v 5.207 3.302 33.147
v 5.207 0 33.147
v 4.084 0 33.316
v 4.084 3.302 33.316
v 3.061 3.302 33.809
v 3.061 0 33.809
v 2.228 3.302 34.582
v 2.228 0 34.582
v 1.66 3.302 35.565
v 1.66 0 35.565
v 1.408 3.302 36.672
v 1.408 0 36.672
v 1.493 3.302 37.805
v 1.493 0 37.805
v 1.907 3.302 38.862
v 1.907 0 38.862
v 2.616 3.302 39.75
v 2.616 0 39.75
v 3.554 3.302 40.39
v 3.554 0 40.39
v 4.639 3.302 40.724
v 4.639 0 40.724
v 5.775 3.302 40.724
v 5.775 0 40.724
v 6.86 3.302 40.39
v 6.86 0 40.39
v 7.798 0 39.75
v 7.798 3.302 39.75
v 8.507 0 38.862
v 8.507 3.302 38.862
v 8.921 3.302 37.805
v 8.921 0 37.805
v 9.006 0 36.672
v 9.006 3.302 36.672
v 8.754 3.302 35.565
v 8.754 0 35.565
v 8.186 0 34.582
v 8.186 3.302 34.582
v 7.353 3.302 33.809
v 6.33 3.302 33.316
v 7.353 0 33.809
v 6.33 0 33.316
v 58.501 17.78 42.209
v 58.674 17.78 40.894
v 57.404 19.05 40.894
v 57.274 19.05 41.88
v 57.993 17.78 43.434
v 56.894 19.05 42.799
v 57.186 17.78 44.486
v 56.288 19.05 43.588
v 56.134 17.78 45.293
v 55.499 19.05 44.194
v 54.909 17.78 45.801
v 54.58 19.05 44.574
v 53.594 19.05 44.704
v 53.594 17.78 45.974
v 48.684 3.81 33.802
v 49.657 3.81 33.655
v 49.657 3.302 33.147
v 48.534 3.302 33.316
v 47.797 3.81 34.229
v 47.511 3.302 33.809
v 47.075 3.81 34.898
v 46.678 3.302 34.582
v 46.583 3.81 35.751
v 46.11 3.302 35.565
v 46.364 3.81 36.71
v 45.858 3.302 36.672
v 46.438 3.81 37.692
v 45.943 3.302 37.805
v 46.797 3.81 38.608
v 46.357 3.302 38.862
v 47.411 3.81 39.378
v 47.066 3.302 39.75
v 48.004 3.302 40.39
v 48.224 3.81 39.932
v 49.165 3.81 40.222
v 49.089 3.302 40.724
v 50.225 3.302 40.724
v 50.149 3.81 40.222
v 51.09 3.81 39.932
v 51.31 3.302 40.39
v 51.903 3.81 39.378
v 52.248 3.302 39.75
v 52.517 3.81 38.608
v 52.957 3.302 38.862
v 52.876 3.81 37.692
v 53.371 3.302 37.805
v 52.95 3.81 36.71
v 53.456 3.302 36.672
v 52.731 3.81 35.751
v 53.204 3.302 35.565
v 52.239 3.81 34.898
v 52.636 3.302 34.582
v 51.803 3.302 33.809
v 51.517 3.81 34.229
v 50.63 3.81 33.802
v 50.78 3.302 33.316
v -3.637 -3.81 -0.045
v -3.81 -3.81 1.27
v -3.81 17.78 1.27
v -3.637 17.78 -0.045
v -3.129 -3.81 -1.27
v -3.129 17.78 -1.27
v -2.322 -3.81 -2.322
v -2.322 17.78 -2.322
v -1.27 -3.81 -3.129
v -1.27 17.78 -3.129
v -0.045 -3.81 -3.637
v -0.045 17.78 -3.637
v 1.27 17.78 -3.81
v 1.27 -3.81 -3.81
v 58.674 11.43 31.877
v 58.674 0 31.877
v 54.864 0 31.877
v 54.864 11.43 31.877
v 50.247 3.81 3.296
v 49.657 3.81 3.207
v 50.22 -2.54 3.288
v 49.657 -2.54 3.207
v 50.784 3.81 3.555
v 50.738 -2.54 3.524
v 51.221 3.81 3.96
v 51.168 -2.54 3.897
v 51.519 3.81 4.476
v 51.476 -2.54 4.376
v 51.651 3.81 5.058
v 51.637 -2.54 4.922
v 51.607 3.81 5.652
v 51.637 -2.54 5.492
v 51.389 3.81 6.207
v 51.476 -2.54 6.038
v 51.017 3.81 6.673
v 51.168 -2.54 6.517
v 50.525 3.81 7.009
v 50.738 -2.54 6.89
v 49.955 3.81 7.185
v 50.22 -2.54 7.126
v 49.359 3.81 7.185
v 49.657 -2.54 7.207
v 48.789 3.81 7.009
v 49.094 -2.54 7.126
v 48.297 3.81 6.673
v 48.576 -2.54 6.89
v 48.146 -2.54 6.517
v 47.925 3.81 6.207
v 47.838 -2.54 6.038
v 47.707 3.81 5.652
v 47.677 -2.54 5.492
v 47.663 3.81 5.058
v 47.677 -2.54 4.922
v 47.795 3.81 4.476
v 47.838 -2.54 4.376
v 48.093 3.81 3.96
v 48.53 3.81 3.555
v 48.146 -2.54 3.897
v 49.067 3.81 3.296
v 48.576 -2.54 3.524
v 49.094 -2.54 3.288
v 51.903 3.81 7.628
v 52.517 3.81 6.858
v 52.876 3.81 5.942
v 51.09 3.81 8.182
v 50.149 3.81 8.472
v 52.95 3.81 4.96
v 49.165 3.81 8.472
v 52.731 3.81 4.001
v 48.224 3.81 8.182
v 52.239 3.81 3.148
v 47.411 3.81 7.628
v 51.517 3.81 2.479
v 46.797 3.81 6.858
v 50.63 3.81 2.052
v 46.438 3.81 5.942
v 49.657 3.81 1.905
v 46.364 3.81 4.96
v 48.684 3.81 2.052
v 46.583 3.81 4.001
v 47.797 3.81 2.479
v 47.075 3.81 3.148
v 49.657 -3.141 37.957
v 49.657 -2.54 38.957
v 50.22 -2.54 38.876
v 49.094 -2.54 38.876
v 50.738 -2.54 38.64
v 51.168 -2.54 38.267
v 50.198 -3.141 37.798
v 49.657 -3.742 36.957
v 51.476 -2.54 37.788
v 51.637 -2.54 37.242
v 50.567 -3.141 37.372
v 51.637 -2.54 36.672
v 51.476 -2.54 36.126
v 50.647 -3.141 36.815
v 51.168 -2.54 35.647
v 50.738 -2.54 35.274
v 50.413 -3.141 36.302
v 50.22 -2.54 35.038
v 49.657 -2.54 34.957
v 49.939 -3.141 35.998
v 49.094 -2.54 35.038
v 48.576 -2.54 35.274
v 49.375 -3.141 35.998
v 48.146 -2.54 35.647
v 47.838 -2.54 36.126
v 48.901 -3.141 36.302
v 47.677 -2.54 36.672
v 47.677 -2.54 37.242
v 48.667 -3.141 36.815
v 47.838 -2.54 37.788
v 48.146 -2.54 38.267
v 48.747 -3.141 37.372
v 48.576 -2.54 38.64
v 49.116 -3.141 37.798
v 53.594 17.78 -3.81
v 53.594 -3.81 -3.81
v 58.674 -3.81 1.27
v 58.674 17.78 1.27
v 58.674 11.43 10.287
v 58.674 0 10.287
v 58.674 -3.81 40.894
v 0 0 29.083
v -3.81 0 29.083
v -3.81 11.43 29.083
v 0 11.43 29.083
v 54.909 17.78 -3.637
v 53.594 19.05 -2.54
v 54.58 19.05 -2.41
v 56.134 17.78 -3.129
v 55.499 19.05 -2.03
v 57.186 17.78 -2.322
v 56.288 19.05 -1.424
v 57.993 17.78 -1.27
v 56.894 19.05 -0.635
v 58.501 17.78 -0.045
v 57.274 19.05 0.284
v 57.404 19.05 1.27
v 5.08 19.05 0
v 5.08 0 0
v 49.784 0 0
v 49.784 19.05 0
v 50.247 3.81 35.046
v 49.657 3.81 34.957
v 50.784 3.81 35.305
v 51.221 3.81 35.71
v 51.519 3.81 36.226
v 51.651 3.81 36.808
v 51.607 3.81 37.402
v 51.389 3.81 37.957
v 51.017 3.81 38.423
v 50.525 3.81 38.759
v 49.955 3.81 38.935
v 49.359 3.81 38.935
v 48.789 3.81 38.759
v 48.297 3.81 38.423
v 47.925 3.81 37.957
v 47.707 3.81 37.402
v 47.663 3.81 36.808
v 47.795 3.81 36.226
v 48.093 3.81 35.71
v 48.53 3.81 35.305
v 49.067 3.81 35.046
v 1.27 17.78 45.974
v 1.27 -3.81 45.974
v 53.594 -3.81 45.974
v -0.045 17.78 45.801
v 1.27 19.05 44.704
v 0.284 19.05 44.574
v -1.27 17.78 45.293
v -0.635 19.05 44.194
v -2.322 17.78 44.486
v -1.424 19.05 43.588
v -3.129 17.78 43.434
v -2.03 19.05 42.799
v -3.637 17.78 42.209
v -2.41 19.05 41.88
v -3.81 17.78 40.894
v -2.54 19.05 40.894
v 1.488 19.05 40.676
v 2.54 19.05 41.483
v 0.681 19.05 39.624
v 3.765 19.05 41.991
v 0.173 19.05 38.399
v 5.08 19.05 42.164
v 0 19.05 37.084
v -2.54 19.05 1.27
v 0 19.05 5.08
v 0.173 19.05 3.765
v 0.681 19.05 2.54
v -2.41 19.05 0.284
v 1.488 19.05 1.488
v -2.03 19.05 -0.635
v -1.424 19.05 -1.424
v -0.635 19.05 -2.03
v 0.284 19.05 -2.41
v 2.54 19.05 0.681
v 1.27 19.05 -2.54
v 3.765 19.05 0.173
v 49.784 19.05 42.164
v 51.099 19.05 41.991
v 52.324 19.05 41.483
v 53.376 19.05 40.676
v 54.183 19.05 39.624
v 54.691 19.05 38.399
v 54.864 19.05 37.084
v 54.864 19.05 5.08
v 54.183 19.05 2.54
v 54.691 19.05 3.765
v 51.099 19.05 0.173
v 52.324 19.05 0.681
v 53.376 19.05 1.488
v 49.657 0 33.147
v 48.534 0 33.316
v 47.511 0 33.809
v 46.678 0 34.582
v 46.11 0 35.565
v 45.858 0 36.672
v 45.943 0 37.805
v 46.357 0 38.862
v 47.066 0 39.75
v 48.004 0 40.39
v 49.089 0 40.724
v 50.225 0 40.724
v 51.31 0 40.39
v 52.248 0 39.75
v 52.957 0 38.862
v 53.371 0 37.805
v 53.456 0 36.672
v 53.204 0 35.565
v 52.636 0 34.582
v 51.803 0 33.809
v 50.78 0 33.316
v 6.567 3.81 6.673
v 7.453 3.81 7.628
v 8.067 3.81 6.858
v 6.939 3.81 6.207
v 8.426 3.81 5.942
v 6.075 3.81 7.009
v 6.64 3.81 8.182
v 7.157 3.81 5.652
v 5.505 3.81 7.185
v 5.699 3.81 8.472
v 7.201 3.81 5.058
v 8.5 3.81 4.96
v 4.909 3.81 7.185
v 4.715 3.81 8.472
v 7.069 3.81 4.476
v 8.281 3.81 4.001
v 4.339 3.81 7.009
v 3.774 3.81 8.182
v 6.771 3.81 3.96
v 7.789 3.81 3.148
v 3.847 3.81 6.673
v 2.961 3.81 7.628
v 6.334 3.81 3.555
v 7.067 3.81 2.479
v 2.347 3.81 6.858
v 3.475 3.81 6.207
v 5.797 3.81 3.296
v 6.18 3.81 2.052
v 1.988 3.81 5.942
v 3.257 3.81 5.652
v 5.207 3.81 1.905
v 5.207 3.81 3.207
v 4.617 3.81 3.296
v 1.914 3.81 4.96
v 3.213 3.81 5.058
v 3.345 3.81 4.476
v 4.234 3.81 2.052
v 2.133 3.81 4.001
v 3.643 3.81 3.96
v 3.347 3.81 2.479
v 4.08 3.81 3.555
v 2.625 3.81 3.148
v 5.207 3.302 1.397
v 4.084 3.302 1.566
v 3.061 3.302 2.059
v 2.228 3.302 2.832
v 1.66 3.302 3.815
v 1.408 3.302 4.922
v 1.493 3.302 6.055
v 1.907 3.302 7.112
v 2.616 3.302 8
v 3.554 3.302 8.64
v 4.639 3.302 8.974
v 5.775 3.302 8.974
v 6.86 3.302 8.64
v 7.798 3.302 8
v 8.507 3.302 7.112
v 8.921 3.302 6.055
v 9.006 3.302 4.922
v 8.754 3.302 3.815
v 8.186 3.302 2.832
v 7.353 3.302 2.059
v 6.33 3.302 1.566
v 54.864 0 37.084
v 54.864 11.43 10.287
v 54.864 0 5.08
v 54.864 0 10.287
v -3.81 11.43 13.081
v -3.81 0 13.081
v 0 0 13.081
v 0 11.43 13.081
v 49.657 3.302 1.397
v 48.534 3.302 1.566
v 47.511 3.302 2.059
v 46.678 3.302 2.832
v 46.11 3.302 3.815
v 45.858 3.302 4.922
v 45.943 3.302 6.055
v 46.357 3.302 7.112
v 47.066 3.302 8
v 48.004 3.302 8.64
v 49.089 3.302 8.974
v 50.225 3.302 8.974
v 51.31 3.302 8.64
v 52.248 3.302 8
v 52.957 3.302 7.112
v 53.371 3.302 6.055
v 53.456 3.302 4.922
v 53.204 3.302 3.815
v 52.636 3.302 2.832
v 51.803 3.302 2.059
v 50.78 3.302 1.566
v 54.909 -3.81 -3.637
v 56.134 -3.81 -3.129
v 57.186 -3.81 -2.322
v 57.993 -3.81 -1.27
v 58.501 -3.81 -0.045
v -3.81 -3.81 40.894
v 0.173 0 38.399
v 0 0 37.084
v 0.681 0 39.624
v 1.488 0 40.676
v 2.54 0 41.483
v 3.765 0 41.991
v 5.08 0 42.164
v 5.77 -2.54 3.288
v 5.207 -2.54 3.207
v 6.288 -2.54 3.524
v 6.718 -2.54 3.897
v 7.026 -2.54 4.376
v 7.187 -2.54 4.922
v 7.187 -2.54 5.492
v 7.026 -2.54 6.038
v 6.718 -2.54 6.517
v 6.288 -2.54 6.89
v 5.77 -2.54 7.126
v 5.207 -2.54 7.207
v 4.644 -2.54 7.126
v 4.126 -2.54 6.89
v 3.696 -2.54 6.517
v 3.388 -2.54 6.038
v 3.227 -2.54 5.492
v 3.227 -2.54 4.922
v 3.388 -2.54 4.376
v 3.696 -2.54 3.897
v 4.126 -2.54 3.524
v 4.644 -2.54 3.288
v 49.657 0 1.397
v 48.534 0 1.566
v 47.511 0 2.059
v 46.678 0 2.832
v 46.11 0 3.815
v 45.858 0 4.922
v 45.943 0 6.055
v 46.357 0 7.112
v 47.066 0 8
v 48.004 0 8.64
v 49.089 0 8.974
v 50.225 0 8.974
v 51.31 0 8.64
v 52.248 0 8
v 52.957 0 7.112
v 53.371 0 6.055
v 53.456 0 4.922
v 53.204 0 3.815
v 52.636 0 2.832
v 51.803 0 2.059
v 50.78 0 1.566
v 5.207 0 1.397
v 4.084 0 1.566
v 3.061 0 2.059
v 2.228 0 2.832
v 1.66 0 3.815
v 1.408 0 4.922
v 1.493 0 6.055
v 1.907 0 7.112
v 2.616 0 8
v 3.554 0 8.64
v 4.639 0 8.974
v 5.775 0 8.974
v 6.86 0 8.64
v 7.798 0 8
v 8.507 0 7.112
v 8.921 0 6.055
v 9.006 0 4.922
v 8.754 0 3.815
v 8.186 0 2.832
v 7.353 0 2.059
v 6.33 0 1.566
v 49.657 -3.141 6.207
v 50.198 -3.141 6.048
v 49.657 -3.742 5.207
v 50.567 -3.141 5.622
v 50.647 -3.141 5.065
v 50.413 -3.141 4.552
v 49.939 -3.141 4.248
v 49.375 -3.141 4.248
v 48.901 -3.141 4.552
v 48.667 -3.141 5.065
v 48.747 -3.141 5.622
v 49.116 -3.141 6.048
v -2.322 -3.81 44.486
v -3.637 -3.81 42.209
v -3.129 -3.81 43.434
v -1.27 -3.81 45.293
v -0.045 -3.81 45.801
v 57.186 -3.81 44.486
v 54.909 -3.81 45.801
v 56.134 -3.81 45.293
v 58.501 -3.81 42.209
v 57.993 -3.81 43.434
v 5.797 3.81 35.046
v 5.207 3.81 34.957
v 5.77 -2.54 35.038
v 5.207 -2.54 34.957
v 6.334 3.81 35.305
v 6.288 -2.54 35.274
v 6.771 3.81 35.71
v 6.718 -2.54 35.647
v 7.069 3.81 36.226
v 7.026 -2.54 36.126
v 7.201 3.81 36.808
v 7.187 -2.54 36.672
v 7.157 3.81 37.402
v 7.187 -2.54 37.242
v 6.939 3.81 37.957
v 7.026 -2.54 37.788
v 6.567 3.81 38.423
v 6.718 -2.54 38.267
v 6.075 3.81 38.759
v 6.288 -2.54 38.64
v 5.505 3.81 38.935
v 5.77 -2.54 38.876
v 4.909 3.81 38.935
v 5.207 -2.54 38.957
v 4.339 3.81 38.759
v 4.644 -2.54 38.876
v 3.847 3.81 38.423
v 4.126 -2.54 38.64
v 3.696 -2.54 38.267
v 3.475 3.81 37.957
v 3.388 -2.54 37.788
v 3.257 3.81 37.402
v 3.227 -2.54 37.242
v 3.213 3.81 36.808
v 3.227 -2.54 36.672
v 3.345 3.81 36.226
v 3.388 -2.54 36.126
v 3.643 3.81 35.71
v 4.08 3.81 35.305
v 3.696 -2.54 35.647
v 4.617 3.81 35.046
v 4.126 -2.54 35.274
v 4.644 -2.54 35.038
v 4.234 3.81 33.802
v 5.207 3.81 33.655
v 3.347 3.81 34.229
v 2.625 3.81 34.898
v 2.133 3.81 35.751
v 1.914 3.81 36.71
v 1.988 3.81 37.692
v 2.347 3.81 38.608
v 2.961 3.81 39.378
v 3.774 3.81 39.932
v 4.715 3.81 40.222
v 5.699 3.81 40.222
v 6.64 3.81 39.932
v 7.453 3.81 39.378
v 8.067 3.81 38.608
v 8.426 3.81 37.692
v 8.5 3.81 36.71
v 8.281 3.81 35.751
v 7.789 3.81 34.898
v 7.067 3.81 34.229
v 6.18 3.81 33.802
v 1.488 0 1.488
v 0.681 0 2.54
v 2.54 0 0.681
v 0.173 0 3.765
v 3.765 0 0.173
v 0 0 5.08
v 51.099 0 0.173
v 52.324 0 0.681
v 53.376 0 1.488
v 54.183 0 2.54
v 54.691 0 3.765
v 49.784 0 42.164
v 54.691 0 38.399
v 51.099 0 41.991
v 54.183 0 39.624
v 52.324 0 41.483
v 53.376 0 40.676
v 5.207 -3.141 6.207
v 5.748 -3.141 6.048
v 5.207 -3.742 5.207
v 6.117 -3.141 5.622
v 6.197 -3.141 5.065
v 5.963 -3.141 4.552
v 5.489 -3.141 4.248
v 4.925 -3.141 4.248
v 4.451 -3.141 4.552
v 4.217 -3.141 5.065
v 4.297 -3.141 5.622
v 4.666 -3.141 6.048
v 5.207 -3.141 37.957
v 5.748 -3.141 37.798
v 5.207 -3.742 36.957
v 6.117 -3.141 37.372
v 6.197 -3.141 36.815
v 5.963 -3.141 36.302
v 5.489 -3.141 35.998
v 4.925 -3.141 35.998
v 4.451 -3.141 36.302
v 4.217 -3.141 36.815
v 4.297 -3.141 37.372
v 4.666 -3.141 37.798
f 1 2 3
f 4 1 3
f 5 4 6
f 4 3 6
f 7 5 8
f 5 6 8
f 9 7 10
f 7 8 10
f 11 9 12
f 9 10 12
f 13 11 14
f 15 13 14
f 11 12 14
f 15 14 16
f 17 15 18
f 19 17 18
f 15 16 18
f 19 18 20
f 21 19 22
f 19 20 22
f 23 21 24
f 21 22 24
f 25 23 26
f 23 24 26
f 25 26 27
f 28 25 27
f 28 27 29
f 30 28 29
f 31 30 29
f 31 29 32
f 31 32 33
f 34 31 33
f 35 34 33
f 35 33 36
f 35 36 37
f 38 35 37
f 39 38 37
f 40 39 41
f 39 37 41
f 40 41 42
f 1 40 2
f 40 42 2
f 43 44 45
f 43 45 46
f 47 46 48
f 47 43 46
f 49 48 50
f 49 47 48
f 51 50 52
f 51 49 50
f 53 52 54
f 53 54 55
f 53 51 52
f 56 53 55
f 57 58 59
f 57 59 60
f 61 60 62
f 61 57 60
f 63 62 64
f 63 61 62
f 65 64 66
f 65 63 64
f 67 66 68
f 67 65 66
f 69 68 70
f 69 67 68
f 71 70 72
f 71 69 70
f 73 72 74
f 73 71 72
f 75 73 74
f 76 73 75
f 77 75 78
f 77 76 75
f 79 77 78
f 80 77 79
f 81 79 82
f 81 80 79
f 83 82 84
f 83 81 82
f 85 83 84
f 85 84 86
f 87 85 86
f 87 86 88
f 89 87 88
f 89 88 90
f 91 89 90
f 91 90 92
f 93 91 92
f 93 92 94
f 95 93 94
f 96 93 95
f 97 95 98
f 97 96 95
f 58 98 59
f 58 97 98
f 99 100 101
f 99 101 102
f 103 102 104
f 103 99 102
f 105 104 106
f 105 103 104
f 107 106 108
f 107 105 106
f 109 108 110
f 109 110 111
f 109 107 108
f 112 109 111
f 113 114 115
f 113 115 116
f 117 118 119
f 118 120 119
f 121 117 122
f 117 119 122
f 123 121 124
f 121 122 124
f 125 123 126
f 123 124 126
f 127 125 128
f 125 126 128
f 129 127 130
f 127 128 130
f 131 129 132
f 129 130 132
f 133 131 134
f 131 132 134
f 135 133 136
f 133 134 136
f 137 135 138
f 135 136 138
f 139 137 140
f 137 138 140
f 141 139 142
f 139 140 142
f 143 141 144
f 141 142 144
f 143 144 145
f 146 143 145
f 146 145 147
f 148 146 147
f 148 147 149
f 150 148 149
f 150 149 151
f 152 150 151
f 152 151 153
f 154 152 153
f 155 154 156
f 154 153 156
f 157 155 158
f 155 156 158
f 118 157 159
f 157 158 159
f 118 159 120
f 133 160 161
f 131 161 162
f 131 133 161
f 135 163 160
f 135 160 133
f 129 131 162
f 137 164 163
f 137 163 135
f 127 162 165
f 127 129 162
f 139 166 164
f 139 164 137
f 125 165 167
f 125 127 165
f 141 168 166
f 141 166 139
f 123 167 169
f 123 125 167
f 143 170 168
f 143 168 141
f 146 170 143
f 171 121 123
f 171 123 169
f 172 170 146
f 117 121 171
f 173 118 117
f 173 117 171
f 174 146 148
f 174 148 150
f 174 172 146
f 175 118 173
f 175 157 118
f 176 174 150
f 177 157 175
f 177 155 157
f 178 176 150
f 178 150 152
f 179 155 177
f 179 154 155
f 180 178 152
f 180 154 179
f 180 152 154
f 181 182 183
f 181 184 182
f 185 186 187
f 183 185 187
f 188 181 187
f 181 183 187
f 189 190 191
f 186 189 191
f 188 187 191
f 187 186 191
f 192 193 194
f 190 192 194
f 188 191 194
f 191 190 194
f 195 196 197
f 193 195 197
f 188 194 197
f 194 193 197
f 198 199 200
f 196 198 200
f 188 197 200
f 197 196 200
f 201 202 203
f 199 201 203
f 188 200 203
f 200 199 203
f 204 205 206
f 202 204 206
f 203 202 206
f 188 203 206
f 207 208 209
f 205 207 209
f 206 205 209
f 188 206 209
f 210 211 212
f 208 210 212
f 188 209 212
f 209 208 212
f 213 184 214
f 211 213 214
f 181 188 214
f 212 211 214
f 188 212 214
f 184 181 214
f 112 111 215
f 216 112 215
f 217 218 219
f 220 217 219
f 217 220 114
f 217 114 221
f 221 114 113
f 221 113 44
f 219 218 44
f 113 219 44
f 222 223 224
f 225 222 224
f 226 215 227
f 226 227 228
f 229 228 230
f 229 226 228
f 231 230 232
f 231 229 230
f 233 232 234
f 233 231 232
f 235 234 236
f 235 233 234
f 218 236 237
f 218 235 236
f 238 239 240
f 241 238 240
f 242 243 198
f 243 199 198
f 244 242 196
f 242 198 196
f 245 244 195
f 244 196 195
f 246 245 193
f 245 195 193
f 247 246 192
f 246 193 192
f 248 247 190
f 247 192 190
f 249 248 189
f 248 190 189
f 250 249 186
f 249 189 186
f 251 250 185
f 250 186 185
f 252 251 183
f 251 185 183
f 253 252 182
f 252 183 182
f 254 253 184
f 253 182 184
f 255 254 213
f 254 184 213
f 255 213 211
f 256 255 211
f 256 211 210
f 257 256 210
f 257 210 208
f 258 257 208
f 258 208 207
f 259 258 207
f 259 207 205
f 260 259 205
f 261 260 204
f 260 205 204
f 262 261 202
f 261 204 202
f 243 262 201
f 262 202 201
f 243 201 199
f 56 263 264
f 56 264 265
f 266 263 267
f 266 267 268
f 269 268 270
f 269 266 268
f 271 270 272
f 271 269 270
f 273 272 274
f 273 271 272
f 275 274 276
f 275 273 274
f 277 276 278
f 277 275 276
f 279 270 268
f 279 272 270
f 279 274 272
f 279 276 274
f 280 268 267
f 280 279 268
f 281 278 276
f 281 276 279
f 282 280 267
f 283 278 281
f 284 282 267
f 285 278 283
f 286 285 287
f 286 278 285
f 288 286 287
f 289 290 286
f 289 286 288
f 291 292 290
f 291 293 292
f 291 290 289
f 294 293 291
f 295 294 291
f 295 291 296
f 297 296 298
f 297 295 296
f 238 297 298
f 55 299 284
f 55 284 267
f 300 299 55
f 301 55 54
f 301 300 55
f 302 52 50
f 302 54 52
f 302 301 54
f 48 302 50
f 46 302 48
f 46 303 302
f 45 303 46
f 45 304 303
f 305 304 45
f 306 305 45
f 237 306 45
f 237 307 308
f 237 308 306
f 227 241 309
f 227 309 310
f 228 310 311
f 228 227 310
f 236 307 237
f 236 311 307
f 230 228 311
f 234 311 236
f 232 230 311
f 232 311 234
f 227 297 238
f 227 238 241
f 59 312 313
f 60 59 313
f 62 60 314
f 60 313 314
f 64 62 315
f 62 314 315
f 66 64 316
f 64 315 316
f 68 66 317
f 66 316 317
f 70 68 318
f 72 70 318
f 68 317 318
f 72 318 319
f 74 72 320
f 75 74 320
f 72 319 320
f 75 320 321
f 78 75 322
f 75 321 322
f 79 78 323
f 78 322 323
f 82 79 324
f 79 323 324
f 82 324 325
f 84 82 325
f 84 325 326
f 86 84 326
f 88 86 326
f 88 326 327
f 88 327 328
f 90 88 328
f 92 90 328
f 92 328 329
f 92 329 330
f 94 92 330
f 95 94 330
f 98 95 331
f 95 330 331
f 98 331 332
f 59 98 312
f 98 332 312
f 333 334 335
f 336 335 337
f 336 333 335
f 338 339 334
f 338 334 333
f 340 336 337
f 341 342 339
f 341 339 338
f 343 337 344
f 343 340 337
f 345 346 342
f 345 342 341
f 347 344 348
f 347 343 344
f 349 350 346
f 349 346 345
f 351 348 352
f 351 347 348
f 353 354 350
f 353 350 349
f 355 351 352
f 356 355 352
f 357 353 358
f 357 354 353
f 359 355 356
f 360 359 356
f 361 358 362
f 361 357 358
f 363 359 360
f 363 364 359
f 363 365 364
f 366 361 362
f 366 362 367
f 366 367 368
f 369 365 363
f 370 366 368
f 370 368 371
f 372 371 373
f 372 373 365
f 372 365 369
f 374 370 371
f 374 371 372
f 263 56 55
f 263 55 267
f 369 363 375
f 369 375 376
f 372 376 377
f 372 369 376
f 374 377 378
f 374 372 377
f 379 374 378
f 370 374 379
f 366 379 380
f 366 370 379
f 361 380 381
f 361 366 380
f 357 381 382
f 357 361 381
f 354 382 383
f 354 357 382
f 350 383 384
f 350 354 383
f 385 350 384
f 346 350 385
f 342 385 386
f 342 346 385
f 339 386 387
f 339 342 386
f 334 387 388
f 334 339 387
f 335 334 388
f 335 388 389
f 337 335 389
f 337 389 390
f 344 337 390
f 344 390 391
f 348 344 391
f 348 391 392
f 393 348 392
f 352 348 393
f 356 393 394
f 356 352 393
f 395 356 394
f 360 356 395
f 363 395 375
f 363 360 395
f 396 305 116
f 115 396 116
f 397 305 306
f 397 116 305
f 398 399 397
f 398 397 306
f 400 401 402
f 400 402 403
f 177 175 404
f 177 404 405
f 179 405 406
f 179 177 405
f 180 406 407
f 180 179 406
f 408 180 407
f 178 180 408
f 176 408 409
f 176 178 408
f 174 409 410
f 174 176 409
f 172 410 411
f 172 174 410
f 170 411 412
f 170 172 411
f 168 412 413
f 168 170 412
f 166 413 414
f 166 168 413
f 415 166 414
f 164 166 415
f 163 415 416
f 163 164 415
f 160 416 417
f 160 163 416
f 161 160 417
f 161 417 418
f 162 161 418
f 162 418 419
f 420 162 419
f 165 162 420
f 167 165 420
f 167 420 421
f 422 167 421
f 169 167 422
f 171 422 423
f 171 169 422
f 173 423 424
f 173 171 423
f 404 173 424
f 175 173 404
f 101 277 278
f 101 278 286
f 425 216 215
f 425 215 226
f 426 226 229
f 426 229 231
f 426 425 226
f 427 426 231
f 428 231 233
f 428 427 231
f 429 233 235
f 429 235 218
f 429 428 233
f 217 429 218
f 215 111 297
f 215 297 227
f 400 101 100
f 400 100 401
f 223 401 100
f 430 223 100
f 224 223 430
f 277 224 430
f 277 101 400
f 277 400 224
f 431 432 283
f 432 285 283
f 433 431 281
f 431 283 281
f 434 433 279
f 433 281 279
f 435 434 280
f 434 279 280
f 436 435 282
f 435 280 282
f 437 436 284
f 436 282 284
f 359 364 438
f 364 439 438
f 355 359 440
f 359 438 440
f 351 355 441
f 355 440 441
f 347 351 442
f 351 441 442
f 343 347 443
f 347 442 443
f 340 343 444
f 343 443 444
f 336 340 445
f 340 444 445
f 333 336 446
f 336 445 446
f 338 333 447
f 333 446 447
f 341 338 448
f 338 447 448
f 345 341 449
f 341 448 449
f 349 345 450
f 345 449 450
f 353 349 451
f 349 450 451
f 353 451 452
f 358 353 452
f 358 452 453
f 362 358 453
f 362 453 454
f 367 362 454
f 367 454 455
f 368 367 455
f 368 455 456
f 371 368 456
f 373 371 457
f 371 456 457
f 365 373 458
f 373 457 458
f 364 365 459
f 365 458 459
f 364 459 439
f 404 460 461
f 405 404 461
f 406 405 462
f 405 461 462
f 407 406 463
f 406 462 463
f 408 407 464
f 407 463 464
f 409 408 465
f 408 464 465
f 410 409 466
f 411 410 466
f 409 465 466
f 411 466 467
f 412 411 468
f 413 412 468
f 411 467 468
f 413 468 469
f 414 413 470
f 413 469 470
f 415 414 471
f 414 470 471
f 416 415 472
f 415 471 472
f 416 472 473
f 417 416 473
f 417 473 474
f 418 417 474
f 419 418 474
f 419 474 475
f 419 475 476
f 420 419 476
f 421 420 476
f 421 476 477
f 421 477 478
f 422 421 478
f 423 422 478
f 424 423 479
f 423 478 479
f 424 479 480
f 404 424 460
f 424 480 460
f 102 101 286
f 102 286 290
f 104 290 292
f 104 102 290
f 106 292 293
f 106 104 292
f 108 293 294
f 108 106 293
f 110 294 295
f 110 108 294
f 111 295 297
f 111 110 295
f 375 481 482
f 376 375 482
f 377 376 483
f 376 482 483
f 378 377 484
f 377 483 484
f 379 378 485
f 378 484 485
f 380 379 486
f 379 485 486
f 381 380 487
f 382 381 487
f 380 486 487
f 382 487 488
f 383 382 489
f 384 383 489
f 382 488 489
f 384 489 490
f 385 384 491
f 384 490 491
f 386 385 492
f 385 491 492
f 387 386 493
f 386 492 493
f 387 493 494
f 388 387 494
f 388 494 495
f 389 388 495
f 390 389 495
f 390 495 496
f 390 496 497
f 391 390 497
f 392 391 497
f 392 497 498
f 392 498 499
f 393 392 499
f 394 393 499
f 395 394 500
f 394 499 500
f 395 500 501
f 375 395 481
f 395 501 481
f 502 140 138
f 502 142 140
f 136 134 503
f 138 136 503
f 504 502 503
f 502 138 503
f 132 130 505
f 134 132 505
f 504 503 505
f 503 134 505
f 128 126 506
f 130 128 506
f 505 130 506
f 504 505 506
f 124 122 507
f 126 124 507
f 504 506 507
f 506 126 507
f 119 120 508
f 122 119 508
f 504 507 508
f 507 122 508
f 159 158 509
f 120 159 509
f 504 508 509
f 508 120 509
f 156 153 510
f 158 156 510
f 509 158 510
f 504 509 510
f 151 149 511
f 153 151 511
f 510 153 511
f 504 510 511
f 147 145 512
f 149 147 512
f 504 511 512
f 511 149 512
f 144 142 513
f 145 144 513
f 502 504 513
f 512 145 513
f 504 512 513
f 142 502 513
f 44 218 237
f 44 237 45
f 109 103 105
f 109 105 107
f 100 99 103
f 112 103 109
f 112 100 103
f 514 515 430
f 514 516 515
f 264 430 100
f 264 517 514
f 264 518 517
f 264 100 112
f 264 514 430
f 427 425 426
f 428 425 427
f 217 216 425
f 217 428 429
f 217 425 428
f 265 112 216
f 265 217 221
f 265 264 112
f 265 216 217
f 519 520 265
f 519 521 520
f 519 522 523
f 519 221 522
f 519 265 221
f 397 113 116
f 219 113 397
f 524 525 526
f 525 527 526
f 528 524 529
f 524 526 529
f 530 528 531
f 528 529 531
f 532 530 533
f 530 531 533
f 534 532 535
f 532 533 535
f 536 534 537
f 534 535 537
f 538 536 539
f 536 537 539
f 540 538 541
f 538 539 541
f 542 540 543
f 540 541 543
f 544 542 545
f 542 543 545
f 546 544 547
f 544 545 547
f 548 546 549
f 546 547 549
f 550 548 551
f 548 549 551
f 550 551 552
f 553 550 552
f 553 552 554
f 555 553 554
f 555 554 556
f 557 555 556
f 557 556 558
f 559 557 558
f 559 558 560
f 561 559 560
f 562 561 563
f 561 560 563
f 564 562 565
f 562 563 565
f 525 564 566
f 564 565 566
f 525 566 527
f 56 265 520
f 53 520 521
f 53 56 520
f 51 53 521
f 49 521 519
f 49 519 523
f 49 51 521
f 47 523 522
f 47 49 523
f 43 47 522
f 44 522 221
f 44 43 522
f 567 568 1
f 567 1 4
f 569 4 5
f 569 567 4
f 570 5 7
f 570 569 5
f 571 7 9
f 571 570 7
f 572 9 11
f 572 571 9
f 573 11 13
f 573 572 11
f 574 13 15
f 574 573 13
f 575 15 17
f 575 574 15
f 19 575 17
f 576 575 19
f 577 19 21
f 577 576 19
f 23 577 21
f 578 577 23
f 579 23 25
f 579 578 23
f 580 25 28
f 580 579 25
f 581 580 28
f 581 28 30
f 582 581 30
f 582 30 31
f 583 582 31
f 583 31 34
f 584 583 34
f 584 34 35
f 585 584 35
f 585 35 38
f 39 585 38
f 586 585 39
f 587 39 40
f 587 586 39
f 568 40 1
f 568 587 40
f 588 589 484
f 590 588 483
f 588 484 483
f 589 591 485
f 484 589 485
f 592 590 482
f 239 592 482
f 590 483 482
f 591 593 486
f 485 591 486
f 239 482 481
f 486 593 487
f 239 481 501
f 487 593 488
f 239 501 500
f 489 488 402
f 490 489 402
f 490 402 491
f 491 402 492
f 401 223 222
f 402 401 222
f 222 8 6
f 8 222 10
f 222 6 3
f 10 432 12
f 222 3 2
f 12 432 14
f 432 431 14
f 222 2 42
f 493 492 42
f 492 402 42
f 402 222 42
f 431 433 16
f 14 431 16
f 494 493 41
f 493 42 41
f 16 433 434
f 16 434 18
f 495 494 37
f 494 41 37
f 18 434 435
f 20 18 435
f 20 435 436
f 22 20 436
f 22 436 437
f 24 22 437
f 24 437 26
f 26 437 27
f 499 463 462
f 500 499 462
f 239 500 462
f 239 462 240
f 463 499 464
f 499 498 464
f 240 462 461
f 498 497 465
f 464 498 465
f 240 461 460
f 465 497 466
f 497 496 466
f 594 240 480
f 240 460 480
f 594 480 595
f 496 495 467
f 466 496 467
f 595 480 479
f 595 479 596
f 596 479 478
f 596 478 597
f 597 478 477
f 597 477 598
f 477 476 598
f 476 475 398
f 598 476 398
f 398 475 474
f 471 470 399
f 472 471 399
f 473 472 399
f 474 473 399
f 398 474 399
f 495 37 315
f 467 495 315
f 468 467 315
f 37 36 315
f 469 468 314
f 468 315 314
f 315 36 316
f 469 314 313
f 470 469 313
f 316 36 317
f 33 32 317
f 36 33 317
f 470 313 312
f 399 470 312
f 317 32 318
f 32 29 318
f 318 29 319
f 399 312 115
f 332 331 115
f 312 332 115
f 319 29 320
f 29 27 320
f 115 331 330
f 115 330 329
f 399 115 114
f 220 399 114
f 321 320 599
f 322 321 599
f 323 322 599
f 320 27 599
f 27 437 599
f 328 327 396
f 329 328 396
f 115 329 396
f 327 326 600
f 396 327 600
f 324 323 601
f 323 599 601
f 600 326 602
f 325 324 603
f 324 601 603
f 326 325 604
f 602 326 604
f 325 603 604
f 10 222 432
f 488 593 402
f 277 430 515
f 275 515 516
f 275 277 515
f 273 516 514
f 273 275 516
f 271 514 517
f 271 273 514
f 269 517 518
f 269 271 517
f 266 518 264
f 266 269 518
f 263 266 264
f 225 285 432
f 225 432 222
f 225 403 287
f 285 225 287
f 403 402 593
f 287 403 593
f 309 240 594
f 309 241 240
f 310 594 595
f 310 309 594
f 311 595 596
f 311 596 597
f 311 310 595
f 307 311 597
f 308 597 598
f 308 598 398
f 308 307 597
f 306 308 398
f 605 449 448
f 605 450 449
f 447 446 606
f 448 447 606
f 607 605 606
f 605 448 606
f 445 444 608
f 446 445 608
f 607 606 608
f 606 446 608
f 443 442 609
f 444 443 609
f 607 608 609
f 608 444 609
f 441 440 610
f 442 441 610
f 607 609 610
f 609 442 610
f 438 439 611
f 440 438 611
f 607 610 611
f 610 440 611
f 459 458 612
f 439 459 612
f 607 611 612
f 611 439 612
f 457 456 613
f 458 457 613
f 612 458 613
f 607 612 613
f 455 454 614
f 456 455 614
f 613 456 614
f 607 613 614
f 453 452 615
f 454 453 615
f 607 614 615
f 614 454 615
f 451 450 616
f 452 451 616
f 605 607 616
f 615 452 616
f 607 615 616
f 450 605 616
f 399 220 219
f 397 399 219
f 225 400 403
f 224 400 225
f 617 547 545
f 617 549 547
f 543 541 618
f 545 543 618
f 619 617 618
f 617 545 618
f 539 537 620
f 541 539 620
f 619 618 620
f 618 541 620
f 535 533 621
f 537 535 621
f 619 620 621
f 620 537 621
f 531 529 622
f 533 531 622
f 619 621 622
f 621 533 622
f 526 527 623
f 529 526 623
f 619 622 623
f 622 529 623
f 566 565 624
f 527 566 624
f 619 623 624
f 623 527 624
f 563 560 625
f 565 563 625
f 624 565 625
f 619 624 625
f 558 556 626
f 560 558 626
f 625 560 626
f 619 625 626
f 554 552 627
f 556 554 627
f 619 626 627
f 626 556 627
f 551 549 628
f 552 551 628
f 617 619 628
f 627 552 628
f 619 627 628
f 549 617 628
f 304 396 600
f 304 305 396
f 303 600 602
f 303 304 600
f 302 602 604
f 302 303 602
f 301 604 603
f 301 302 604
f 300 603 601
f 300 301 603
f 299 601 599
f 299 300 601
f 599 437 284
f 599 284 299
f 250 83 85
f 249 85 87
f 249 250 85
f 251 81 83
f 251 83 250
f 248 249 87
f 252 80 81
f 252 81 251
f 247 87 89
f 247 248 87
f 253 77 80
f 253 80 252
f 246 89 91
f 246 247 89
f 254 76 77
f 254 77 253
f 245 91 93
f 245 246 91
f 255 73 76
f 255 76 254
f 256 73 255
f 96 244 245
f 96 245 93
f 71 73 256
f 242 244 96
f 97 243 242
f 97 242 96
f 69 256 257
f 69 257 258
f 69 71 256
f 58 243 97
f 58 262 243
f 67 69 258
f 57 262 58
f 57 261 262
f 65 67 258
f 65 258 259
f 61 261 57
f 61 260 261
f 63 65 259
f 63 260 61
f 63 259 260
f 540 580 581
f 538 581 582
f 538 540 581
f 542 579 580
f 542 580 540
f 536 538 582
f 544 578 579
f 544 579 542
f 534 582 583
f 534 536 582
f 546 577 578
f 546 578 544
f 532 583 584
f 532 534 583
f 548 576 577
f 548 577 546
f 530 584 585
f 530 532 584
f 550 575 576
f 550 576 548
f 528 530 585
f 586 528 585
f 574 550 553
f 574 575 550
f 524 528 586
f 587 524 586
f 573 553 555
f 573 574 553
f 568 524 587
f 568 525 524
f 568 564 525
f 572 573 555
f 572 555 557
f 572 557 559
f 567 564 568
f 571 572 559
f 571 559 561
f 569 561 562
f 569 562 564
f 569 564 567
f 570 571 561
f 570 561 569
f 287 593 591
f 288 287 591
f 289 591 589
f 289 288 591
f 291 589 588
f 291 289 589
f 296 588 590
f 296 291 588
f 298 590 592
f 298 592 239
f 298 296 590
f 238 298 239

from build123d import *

# Parameters (mm, degrees)
SKETCH1_W                    = 62.484
SKETCH1_H                    = 49.784
SKETCH1_W_2                  = 54.864
SKETCH1_H_2                  = 42.164
BOSS_EXTRUDE1_DEPTH          = 19.05
SKETCH3_W                    = 62.484
SKETCH3_H                    = 49.784
BOSS_EXTRUDE2_DEPTH          = 3.81
FILLET1_R                    = 5.08
SKETCH4_R                    = 3.81
BOSS_EXTRUDE3_DEPTH          = 3.81
F_4_0_4_DIAMETER_HOLE1_D     = 4
F_4_0_4_DIAMETER_HOLE1_DEPTH = 6.35
F_4_0_4_DIAMETER_HOLE1_TIP   = 1.201721238
CUT_EXTRUDE1_REACH           = 81.88
SKETCH8_W                    = 21.59
SKETCH8_H                    = 11.43
CUT_EXTRUDE2_REACH           = 81.88
SKETCH9_W                    = 16.002
SKETCH9_H                    = 11.43
FILLET2_R                    = 5.08
CHAMFER1_SIZE                = 1.27
CHAMFER2_SIZE                = 0.508


with BuildPart() as part:
    # Sketch1 → Boss-Extrude1 (new body)
    with BuildSketch(Plane(origin=(0, 0, 0), x_dir=(1, 0, 0), z_dir=(0, 1, 0))):
        with Locations((27.432, -21.082)):
            Rectangle(SKETCH1_W, SKETCH1_H)
        with Locations((27.432, -21.082)):
            Rectangle(SKETCH1_W_2, SKETCH1_H_2, mode=Mode.SUBTRACT)
    extrude(amount=BOSS_EXTRUDE1_DEPTH)

    # Sketch3 → Boss-Extrude2 (add)
    with BuildSketch(Plane.XZ):
        with Locations((27.432, 21.082)):
            Rectangle(SKETCH3_W, SKETCH3_H)
    extrude(amount=BOSS_EXTRUDE2_DEPTH)

    # Fillet1
    fillet1_edges = [part.edges().sort_by_distance(p)[0] for p in [
        (0, 9.525, 0),
        (0, 9.525, 42.164),
        (54.864, 9.525, 42.164),
        (54.864, 9.525, 0),
    ]]
    fillet(fillet1_edges, radius=FILLET1_R)

    # Sketch4 → Boss-Extrude3 (add)
    with BuildSketch(Plane(origin=(0, 0, 0), x_dir=(1, 0, 0), z_dir=(0, 1, 0))):
        with Locations(Location((49.657, -5.207, 0), (0, 0, 90))):
            Circle(SKETCH4_R)
        with Locations(Location((49.657, -36.957, 0), (0, 0, 90))):
            Circle(SKETCH4_R)
        with Locations(Location((5.207, -36.957, 0), (0, 0, 90))):
            Circle(SKETCH4_R)
        with Locations(Location((5.207, -5.207, 0), (0, 0, 90))):
            Circle(SKETCH4_R)
    extrude(amount=BOSS_EXTRUDE3_DEPTH)

    # Ø4.0 (4) Diameter Hole1
    with Locations(Plane(origin=(5.207, 3.81, 5.207), x_dir=(0, 0, 1), z_dir=(0, 1, 0))):
        with Locations((0, 0), (31.75, 0), (31.75, 44.45), (0, 44.45)):
            Hole(F_4_0_4_DIAMETER_HOLE1_D / 2, depth=F_4_0_4_DIAMETER_HOLE1_DEPTH)
            with Locations((0, 0, -(F_4_0_4_DIAMETER_HOLE1_DEPTH + F_4_0_4_DIAMETER_HOLE1_TIP / 2))):  # 118° drill point
                Cone(0, F_4_0_4_DIAMETER_HOLE1_D / 2, F_4_0_4_DIAMETER_HOLE1_TIP, mode=Mode.SUBTRACT)

    # Sketch8 → Cut-Extrude1 (cut, up to next)
    with BuildSketch(Plane(origin=(58.674, 0, 0), x_dir=(0, 0, -1), z_dir=(1, 0, 0)), mode=Mode.PRIVATE) as cut_extrude1_sk1:
        with Locations((-21.082, 5.715)):
            Rectangle(SKETCH8_W, SKETCH8_H)
    cut_extrude1_tool1 = extrude(cut_extrude1_sk1.sketch, amount=-CUT_EXTRUDE1_REACH, mode=Mode.PRIVATE) & part.part
    add(cut_extrude1_tool1.solids().sort_by_distance((58.674, 5.715, 21.082))[0], mode=Mode.SUBTRACT)

    # Sketch9 → Cut-Extrude2 (cut, up to next)
    with BuildSketch(Plane.ZY.offset(3.81), mode=Mode.PRIVATE) as cut_extrude2_sk1:
        with Locations((21.082, 5.715)):
            Rectangle(SKETCH9_W, SKETCH9_H)
    cut_extrude2_tool1 = extrude(cut_extrude2_sk1.sketch, amount=-CUT_EXTRUDE2_REACH, mode=Mode.PRIVATE) & part.part
    add(cut_extrude2_tool1.solids().sort_by_distance((-3.81, 5.715, 21.082))[0], mode=Mode.SUBTRACT)

    # Fillet2
    fillet2_edges = [part.edges().sort_by_distance(p)[0] for p in [
        (-3.81, 7.62, -3.81),
        (58.674, 7.62, -3.81),
        (58.674, 7.62, 45.974),
        (-3.81, 7.62, 45.974),
    ]]
    fillet(fillet2_edges, radius=FILLET2_R)

    # Chamfer1
    chamfer1_edges = [part.edges().sort_by_distance(p)[0] for p in [
        (-3.81, 19.05, 21.082),
        (27.432, 19.05, -3.81),
        (27.432, 19.05, 45.974),
        (58.674, 19.05, 21.082),
        (-2.322102448, 19.05, 44.486102448),
        (57.186102448, 19.05, 44.486102448),
        (57.186102448, 19.05, -2.322102448),
        (-2.322102448, 19.05, -2.322102448),
    ]]
    chamfer(chamfer1_edges, length=CHAMFER1_SIZE)

    # Chamfer2
    chamfer2_edges = [part.edges().sort_by_distance(p)[0] for p in [
        (49.657, 3.81, 9.017),
        (49.657, 3.81, 40.767),
        (5.207, 3.81, 40.767),
        (5.207, 3.81, 9.017),
    ]]
    chamfer(chamfer2_edges, length=CHAMFER2_SIZE)


solid = part.part
